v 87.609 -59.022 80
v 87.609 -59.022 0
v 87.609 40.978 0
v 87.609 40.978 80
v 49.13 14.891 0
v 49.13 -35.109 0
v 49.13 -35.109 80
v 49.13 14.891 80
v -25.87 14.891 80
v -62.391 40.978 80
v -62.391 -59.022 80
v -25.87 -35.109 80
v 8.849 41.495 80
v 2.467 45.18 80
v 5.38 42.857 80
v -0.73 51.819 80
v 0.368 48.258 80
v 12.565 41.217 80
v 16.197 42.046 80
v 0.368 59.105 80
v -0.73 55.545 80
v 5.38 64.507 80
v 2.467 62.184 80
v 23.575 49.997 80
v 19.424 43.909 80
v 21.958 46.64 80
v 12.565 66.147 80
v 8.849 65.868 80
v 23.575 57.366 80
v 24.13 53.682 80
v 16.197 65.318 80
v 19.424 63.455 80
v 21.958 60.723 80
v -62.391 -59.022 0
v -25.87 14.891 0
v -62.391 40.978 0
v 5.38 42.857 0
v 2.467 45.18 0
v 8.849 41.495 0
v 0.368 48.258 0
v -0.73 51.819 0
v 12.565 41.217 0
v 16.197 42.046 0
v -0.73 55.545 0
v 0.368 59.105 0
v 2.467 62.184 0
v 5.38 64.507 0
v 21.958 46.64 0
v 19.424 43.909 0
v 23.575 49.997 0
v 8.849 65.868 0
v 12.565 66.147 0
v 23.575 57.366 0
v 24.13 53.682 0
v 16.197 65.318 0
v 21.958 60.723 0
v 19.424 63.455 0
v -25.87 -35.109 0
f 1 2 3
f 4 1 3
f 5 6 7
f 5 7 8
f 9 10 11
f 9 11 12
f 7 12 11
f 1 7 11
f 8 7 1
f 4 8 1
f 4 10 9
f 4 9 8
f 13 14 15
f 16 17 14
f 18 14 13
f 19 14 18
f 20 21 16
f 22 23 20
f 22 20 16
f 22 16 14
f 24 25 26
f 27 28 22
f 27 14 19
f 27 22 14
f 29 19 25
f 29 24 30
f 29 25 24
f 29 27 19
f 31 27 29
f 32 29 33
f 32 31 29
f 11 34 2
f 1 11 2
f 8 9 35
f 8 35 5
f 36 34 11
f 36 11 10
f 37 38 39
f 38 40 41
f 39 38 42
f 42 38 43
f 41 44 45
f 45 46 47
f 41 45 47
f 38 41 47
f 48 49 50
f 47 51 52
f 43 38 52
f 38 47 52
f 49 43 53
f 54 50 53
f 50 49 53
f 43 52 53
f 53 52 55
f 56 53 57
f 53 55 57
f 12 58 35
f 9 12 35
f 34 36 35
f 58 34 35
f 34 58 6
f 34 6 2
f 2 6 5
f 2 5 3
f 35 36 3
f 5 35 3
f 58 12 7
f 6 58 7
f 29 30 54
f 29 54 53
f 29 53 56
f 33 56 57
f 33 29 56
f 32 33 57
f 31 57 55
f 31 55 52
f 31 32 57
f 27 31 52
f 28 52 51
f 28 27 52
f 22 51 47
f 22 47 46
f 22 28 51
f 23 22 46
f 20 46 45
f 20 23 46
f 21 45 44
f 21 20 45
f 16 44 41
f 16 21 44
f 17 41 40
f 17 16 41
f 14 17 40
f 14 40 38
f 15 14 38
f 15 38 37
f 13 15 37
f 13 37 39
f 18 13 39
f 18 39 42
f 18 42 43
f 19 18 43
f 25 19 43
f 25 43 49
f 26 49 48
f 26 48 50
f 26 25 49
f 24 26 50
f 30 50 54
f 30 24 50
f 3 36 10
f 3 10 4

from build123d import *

# Parameters (mm, degrees)
ESQUISSE1_W        = 150
ESQUISSE1_H        = 100
ESQUISSE1_W_2      = 75
ESQUISSE1_H_2      = 50
BOSS_EXTRU_1_DEPTH = 80
ESQUISSE3_R        = 12.5
BOSS_EXTRU_2_DEPTH = 80


with BuildPart() as part:
    # Esquisse1 → Boss.-Extru.1 (new body)
    with BuildSketch(Plane.XY):
        with Locations((12.608695652, -9.02173913)):
            Rectangle(ESQUISSE1_W, ESQUISSE1_H)
        with Locations((11.630434783, -10.108695652)):
            Rectangle(ESQUISSE1_W_2, ESQUISSE1_H_2, mode=Mode.SUBTRACT)
    extrude(amount=BOSS_EXTRU_1_DEPTH)


with BuildPart() as body_2:
    # Esquisse3 → Boss.-Extru.2 (new body)
    with BuildSketch(Plane.XY.offset(80)):
        with Locations((11.630434783, 53.681823265)):
            Circle(ESQUISSE3_R)
    extrude(amount=-BOSS_EXTRU_2_DEPTH)


solid = Compound([part.part, body_2.part])
